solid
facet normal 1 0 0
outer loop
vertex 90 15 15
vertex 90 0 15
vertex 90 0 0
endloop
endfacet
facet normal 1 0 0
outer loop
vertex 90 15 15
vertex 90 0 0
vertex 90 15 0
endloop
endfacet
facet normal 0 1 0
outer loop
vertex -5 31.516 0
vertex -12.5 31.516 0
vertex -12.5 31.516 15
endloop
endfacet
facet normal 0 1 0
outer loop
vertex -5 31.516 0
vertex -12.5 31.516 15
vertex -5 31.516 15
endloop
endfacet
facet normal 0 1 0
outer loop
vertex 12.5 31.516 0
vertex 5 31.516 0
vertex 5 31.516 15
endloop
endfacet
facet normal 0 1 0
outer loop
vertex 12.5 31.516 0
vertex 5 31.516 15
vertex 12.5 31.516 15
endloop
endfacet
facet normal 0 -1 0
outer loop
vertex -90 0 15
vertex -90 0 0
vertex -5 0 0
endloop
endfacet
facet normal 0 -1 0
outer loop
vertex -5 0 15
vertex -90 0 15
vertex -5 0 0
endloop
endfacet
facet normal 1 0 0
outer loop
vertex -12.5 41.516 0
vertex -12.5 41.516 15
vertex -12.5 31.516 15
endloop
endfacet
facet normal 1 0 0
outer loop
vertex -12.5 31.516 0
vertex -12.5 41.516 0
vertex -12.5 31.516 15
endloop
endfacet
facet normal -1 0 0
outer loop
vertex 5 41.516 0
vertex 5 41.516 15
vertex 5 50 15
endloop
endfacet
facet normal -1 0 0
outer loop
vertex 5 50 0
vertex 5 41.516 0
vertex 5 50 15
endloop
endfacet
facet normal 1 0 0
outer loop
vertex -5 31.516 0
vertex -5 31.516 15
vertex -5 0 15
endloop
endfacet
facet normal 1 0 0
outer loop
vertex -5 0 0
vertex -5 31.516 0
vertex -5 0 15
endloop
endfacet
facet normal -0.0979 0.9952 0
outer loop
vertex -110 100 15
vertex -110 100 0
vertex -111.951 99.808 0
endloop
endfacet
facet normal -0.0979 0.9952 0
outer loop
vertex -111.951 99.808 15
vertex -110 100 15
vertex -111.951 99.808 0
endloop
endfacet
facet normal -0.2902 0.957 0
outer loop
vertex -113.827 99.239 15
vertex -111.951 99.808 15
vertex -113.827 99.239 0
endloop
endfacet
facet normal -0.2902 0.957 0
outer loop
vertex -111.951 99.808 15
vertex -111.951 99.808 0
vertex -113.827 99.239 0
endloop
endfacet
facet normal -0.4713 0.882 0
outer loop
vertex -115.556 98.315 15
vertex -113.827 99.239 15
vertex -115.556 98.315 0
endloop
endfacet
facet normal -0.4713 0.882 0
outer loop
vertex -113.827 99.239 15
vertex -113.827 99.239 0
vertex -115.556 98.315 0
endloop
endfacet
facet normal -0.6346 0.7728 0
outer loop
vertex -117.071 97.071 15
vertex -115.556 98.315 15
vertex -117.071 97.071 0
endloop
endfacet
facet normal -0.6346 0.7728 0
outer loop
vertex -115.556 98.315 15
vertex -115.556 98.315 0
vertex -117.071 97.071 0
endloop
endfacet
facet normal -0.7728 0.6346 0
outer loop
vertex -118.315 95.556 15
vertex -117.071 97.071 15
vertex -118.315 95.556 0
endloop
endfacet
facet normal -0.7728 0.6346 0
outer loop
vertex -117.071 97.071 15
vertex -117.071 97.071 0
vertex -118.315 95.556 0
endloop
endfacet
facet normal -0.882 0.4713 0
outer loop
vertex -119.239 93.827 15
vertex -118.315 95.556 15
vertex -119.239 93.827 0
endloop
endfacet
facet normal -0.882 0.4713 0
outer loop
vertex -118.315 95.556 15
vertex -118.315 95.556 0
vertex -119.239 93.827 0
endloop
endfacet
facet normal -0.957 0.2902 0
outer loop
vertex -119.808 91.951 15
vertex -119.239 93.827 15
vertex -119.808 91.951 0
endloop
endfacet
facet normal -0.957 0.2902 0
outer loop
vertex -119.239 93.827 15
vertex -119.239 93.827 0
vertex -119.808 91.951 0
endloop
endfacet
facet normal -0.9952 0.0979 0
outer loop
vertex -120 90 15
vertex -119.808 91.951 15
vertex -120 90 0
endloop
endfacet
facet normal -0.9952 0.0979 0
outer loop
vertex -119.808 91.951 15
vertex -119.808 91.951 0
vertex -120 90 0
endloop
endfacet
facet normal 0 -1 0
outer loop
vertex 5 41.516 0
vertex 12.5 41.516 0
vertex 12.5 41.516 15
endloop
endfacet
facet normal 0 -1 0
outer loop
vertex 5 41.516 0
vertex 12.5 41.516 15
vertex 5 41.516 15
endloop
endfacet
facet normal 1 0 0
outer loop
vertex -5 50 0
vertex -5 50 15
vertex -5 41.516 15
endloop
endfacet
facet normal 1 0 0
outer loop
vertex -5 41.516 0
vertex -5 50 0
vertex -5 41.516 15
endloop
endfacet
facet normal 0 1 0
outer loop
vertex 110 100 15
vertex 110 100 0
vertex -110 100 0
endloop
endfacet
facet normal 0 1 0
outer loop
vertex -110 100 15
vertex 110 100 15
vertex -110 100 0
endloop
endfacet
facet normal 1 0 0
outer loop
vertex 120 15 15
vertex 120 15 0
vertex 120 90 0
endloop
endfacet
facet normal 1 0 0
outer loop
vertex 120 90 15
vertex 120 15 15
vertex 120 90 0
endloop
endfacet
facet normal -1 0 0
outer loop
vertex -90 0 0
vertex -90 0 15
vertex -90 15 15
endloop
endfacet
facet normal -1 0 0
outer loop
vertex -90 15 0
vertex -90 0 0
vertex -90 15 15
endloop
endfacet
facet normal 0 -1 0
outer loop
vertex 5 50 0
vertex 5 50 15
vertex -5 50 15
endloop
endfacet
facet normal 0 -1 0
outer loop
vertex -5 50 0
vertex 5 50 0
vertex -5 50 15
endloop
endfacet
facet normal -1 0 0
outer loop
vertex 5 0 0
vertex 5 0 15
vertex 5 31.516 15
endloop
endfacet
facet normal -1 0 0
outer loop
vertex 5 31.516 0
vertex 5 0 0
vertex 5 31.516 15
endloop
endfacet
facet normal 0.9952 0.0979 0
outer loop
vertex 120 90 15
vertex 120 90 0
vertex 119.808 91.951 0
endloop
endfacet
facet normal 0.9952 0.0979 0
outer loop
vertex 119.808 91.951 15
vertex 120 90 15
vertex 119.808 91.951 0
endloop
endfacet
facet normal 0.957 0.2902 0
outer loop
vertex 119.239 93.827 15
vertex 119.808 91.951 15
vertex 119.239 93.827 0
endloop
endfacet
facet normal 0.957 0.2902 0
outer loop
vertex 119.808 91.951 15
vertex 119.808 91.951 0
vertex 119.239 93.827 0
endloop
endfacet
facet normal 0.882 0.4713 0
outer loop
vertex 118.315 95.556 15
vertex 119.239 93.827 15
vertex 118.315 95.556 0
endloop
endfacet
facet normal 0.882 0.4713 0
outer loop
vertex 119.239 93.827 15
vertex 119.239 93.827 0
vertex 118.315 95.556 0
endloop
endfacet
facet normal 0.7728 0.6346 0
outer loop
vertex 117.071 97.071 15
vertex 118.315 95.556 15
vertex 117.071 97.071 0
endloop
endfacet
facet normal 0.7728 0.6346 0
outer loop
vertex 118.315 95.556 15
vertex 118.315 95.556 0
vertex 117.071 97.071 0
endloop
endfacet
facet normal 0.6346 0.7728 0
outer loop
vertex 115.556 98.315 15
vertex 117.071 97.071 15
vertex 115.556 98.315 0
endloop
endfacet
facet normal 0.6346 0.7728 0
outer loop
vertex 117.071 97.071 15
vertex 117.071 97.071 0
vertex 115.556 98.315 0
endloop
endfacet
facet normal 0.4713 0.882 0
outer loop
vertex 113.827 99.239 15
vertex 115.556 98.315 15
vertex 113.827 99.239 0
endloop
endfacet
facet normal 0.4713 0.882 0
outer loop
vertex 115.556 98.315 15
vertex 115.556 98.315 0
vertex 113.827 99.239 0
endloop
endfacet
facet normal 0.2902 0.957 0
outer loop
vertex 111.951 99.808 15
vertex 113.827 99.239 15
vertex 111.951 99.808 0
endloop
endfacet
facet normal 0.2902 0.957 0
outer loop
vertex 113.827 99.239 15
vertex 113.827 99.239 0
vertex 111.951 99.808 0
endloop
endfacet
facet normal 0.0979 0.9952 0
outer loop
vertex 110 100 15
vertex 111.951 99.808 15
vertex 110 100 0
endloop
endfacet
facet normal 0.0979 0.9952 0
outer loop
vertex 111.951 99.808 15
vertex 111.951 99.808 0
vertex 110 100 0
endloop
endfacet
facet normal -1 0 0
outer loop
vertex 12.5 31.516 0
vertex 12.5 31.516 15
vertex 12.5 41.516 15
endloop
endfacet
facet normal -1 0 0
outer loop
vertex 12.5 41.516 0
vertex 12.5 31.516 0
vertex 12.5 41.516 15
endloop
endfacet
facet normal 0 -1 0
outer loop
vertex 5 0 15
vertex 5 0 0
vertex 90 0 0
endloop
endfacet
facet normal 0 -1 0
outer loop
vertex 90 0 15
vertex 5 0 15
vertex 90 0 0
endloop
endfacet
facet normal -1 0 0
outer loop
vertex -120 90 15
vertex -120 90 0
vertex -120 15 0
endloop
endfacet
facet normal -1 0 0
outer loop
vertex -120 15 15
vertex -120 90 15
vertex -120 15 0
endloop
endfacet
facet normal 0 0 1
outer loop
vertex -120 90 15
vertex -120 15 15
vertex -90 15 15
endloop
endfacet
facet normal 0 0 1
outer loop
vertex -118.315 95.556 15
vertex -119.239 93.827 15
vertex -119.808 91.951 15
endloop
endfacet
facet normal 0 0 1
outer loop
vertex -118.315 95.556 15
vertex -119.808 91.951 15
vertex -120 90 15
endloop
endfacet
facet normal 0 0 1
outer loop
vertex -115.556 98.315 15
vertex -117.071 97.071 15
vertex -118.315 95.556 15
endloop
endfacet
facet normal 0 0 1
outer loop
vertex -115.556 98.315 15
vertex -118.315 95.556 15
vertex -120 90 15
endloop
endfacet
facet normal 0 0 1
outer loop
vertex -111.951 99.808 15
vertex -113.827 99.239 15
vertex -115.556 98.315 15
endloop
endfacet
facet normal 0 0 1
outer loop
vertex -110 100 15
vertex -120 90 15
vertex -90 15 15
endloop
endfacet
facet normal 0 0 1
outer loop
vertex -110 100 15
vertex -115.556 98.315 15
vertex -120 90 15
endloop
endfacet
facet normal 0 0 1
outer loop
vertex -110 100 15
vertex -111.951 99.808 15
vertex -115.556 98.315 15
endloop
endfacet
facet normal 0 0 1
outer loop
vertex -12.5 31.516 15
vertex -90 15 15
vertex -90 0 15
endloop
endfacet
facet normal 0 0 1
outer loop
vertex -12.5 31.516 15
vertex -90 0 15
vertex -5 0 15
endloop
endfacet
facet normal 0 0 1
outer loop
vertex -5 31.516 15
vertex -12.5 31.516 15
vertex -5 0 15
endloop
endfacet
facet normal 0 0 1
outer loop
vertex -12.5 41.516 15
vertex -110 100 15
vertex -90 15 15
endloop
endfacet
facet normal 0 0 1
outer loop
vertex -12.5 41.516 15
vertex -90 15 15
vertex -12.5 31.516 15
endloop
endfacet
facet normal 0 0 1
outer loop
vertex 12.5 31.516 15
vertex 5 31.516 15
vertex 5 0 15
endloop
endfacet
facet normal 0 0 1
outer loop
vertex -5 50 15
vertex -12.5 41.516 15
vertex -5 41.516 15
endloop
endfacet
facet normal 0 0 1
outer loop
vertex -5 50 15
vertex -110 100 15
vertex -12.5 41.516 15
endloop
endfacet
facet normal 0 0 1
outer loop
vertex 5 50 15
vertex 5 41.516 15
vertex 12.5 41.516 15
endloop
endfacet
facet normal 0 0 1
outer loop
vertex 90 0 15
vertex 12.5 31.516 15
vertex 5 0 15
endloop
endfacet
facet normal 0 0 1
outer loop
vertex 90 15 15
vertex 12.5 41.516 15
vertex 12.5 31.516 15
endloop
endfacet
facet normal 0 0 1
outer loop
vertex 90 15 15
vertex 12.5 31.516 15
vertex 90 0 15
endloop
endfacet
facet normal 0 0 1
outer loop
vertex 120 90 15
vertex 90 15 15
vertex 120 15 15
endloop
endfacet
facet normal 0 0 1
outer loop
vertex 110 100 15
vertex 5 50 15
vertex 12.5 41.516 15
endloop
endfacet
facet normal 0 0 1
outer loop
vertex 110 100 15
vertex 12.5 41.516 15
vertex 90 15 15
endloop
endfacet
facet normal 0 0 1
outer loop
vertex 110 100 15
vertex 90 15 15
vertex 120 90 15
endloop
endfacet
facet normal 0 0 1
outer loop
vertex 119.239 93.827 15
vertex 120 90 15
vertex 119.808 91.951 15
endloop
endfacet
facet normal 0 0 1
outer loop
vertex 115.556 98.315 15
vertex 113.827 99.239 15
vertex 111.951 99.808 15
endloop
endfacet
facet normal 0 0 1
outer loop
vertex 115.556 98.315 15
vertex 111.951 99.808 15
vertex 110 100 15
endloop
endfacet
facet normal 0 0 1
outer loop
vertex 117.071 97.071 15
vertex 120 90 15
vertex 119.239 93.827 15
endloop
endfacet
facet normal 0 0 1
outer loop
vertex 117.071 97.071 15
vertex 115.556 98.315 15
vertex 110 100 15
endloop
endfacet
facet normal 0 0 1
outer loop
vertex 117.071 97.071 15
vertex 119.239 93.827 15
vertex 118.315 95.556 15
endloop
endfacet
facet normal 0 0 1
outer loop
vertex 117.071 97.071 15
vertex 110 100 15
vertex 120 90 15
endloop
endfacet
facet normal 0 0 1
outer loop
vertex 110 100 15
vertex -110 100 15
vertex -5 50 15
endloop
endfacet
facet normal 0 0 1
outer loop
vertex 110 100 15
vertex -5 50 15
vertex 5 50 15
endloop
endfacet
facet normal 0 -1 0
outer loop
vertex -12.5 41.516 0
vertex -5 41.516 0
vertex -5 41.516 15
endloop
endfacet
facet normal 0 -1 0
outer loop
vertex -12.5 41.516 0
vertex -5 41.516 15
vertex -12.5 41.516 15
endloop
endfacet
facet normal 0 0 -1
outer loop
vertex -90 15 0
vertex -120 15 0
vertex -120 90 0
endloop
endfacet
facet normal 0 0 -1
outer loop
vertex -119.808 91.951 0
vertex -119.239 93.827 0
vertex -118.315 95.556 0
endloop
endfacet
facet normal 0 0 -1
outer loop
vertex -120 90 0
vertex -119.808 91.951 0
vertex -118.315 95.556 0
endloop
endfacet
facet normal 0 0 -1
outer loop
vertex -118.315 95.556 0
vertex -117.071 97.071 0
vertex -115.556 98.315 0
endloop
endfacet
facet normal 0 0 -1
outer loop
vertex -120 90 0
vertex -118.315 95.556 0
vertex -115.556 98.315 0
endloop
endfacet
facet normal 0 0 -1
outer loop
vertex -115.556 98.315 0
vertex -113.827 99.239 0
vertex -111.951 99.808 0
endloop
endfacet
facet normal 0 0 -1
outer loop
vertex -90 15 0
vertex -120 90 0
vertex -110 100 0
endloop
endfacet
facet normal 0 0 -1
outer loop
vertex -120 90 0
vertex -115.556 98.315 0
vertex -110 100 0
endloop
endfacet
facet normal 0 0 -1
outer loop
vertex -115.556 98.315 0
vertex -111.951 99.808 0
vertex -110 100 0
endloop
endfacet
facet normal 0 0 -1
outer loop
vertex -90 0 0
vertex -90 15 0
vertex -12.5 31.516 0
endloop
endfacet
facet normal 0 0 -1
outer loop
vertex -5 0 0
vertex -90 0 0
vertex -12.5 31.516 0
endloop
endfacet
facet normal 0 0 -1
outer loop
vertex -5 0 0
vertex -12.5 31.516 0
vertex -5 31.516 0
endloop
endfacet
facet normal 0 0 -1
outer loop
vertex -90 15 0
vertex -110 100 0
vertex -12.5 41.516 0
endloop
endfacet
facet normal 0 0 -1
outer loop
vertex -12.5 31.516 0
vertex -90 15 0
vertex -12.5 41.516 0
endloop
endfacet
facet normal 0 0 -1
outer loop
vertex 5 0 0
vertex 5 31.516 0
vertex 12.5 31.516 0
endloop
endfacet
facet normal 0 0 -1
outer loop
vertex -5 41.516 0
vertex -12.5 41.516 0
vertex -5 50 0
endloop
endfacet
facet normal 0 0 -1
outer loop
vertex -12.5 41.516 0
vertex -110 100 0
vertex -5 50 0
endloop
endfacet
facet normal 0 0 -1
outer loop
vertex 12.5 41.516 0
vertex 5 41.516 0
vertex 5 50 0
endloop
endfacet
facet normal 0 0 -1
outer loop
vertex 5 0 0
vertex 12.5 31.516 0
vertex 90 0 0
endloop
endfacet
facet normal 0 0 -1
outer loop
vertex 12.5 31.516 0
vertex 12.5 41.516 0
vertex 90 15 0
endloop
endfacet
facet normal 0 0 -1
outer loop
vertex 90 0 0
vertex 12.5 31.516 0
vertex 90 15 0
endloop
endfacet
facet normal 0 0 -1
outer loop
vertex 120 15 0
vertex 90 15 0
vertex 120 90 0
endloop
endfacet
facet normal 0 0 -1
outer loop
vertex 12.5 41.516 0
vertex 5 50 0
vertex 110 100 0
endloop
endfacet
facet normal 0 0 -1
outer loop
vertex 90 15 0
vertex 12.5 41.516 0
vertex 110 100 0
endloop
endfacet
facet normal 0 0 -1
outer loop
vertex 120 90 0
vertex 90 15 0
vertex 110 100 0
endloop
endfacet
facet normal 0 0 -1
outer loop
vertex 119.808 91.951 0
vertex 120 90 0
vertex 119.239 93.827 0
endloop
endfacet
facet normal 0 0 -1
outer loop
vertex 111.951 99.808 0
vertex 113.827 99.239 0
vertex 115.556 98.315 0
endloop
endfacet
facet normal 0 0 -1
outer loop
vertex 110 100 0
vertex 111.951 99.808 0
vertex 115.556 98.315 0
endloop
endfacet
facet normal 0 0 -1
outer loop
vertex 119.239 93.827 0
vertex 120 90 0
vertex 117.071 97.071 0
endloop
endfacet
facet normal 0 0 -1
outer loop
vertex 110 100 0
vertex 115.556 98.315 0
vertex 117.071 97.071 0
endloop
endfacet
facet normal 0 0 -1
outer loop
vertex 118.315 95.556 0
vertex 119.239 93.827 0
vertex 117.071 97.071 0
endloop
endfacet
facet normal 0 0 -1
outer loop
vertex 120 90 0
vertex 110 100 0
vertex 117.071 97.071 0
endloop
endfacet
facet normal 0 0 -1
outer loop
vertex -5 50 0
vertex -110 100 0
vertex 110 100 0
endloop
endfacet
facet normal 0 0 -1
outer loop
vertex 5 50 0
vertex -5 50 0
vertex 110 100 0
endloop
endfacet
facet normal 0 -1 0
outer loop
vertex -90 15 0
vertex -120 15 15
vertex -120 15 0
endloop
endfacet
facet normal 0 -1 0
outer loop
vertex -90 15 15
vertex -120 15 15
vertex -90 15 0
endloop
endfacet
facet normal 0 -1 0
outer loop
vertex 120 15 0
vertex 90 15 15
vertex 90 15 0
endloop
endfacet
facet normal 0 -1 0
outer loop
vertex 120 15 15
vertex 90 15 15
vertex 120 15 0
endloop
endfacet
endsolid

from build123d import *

# Parameters (mm, degrees)
BOSS_EXTRU_1_DEPTH      = 15
ESQUISSE3_W             = 30
ESQUISSE3_H             = 15
ENL_V_MAT_EXTRU_1_DEPTH = 15


with BuildPart() as part:
    # Esquisse2 → Boss.-Extru.1 (new body)
    with BuildSketch(Plane.XY):
        with BuildLine():
            Line((-120, 0), (120, 0))
            Line((120, 0), (120, 15))
            Line((120, 15), (120, 55.414518843))
            Line((120, 55.414518843), (120, 75.414518843))
            Line((120, 75.414518843), (120, 90))
            ThreePointArc((120, 90), (117.071067812, 97.071067812), (110, 100))
            Line((110, 100), (-110, 100))
            ThreePointArc((-110, 100), (-117.071067812, 97.071067812), (-120, 90))
            Line((-120, 90), (-120, 75.414518843))
            Line((-120, 75.414518843), (-120, 55.414518843))
            Line((-120, 55.414518843), (-120, 15))
            Line((-120, 15), (-120, 0))
        make_face()
    extrude(amount=BOSS_EXTRU_1_DEPTH)

    # Esquisse3 → Enlèv. mat.-Extru.1 (cut)
    with BuildSketch(Plane.XY.offset(15)):
        with Locations((-105, 7.5)):
            Rectangle(ESQUISSE3_W, ESQUISSE3_H)
        Polygon((-5, 31.515847226), (-5, 0), (5, 0), (5, 31.515847226), (12.5, 31.515847226), (12.5, 41.515847226), (5, 41.515847226), (5, 50), (-5, 50), (-5, 41.515847226), (-12.5, 41.515847226), (-12.5, 31.515847226), align=None)
        with Locations((105, 7.5)):
            Rectangle(ESQUISSE3_W, ESQUISSE3_H)
    extrude(amount=-ENL_V_MAT_EXTRU_1_DEPTH, mode=Mode.SUBTRACT)


solid = part.part
